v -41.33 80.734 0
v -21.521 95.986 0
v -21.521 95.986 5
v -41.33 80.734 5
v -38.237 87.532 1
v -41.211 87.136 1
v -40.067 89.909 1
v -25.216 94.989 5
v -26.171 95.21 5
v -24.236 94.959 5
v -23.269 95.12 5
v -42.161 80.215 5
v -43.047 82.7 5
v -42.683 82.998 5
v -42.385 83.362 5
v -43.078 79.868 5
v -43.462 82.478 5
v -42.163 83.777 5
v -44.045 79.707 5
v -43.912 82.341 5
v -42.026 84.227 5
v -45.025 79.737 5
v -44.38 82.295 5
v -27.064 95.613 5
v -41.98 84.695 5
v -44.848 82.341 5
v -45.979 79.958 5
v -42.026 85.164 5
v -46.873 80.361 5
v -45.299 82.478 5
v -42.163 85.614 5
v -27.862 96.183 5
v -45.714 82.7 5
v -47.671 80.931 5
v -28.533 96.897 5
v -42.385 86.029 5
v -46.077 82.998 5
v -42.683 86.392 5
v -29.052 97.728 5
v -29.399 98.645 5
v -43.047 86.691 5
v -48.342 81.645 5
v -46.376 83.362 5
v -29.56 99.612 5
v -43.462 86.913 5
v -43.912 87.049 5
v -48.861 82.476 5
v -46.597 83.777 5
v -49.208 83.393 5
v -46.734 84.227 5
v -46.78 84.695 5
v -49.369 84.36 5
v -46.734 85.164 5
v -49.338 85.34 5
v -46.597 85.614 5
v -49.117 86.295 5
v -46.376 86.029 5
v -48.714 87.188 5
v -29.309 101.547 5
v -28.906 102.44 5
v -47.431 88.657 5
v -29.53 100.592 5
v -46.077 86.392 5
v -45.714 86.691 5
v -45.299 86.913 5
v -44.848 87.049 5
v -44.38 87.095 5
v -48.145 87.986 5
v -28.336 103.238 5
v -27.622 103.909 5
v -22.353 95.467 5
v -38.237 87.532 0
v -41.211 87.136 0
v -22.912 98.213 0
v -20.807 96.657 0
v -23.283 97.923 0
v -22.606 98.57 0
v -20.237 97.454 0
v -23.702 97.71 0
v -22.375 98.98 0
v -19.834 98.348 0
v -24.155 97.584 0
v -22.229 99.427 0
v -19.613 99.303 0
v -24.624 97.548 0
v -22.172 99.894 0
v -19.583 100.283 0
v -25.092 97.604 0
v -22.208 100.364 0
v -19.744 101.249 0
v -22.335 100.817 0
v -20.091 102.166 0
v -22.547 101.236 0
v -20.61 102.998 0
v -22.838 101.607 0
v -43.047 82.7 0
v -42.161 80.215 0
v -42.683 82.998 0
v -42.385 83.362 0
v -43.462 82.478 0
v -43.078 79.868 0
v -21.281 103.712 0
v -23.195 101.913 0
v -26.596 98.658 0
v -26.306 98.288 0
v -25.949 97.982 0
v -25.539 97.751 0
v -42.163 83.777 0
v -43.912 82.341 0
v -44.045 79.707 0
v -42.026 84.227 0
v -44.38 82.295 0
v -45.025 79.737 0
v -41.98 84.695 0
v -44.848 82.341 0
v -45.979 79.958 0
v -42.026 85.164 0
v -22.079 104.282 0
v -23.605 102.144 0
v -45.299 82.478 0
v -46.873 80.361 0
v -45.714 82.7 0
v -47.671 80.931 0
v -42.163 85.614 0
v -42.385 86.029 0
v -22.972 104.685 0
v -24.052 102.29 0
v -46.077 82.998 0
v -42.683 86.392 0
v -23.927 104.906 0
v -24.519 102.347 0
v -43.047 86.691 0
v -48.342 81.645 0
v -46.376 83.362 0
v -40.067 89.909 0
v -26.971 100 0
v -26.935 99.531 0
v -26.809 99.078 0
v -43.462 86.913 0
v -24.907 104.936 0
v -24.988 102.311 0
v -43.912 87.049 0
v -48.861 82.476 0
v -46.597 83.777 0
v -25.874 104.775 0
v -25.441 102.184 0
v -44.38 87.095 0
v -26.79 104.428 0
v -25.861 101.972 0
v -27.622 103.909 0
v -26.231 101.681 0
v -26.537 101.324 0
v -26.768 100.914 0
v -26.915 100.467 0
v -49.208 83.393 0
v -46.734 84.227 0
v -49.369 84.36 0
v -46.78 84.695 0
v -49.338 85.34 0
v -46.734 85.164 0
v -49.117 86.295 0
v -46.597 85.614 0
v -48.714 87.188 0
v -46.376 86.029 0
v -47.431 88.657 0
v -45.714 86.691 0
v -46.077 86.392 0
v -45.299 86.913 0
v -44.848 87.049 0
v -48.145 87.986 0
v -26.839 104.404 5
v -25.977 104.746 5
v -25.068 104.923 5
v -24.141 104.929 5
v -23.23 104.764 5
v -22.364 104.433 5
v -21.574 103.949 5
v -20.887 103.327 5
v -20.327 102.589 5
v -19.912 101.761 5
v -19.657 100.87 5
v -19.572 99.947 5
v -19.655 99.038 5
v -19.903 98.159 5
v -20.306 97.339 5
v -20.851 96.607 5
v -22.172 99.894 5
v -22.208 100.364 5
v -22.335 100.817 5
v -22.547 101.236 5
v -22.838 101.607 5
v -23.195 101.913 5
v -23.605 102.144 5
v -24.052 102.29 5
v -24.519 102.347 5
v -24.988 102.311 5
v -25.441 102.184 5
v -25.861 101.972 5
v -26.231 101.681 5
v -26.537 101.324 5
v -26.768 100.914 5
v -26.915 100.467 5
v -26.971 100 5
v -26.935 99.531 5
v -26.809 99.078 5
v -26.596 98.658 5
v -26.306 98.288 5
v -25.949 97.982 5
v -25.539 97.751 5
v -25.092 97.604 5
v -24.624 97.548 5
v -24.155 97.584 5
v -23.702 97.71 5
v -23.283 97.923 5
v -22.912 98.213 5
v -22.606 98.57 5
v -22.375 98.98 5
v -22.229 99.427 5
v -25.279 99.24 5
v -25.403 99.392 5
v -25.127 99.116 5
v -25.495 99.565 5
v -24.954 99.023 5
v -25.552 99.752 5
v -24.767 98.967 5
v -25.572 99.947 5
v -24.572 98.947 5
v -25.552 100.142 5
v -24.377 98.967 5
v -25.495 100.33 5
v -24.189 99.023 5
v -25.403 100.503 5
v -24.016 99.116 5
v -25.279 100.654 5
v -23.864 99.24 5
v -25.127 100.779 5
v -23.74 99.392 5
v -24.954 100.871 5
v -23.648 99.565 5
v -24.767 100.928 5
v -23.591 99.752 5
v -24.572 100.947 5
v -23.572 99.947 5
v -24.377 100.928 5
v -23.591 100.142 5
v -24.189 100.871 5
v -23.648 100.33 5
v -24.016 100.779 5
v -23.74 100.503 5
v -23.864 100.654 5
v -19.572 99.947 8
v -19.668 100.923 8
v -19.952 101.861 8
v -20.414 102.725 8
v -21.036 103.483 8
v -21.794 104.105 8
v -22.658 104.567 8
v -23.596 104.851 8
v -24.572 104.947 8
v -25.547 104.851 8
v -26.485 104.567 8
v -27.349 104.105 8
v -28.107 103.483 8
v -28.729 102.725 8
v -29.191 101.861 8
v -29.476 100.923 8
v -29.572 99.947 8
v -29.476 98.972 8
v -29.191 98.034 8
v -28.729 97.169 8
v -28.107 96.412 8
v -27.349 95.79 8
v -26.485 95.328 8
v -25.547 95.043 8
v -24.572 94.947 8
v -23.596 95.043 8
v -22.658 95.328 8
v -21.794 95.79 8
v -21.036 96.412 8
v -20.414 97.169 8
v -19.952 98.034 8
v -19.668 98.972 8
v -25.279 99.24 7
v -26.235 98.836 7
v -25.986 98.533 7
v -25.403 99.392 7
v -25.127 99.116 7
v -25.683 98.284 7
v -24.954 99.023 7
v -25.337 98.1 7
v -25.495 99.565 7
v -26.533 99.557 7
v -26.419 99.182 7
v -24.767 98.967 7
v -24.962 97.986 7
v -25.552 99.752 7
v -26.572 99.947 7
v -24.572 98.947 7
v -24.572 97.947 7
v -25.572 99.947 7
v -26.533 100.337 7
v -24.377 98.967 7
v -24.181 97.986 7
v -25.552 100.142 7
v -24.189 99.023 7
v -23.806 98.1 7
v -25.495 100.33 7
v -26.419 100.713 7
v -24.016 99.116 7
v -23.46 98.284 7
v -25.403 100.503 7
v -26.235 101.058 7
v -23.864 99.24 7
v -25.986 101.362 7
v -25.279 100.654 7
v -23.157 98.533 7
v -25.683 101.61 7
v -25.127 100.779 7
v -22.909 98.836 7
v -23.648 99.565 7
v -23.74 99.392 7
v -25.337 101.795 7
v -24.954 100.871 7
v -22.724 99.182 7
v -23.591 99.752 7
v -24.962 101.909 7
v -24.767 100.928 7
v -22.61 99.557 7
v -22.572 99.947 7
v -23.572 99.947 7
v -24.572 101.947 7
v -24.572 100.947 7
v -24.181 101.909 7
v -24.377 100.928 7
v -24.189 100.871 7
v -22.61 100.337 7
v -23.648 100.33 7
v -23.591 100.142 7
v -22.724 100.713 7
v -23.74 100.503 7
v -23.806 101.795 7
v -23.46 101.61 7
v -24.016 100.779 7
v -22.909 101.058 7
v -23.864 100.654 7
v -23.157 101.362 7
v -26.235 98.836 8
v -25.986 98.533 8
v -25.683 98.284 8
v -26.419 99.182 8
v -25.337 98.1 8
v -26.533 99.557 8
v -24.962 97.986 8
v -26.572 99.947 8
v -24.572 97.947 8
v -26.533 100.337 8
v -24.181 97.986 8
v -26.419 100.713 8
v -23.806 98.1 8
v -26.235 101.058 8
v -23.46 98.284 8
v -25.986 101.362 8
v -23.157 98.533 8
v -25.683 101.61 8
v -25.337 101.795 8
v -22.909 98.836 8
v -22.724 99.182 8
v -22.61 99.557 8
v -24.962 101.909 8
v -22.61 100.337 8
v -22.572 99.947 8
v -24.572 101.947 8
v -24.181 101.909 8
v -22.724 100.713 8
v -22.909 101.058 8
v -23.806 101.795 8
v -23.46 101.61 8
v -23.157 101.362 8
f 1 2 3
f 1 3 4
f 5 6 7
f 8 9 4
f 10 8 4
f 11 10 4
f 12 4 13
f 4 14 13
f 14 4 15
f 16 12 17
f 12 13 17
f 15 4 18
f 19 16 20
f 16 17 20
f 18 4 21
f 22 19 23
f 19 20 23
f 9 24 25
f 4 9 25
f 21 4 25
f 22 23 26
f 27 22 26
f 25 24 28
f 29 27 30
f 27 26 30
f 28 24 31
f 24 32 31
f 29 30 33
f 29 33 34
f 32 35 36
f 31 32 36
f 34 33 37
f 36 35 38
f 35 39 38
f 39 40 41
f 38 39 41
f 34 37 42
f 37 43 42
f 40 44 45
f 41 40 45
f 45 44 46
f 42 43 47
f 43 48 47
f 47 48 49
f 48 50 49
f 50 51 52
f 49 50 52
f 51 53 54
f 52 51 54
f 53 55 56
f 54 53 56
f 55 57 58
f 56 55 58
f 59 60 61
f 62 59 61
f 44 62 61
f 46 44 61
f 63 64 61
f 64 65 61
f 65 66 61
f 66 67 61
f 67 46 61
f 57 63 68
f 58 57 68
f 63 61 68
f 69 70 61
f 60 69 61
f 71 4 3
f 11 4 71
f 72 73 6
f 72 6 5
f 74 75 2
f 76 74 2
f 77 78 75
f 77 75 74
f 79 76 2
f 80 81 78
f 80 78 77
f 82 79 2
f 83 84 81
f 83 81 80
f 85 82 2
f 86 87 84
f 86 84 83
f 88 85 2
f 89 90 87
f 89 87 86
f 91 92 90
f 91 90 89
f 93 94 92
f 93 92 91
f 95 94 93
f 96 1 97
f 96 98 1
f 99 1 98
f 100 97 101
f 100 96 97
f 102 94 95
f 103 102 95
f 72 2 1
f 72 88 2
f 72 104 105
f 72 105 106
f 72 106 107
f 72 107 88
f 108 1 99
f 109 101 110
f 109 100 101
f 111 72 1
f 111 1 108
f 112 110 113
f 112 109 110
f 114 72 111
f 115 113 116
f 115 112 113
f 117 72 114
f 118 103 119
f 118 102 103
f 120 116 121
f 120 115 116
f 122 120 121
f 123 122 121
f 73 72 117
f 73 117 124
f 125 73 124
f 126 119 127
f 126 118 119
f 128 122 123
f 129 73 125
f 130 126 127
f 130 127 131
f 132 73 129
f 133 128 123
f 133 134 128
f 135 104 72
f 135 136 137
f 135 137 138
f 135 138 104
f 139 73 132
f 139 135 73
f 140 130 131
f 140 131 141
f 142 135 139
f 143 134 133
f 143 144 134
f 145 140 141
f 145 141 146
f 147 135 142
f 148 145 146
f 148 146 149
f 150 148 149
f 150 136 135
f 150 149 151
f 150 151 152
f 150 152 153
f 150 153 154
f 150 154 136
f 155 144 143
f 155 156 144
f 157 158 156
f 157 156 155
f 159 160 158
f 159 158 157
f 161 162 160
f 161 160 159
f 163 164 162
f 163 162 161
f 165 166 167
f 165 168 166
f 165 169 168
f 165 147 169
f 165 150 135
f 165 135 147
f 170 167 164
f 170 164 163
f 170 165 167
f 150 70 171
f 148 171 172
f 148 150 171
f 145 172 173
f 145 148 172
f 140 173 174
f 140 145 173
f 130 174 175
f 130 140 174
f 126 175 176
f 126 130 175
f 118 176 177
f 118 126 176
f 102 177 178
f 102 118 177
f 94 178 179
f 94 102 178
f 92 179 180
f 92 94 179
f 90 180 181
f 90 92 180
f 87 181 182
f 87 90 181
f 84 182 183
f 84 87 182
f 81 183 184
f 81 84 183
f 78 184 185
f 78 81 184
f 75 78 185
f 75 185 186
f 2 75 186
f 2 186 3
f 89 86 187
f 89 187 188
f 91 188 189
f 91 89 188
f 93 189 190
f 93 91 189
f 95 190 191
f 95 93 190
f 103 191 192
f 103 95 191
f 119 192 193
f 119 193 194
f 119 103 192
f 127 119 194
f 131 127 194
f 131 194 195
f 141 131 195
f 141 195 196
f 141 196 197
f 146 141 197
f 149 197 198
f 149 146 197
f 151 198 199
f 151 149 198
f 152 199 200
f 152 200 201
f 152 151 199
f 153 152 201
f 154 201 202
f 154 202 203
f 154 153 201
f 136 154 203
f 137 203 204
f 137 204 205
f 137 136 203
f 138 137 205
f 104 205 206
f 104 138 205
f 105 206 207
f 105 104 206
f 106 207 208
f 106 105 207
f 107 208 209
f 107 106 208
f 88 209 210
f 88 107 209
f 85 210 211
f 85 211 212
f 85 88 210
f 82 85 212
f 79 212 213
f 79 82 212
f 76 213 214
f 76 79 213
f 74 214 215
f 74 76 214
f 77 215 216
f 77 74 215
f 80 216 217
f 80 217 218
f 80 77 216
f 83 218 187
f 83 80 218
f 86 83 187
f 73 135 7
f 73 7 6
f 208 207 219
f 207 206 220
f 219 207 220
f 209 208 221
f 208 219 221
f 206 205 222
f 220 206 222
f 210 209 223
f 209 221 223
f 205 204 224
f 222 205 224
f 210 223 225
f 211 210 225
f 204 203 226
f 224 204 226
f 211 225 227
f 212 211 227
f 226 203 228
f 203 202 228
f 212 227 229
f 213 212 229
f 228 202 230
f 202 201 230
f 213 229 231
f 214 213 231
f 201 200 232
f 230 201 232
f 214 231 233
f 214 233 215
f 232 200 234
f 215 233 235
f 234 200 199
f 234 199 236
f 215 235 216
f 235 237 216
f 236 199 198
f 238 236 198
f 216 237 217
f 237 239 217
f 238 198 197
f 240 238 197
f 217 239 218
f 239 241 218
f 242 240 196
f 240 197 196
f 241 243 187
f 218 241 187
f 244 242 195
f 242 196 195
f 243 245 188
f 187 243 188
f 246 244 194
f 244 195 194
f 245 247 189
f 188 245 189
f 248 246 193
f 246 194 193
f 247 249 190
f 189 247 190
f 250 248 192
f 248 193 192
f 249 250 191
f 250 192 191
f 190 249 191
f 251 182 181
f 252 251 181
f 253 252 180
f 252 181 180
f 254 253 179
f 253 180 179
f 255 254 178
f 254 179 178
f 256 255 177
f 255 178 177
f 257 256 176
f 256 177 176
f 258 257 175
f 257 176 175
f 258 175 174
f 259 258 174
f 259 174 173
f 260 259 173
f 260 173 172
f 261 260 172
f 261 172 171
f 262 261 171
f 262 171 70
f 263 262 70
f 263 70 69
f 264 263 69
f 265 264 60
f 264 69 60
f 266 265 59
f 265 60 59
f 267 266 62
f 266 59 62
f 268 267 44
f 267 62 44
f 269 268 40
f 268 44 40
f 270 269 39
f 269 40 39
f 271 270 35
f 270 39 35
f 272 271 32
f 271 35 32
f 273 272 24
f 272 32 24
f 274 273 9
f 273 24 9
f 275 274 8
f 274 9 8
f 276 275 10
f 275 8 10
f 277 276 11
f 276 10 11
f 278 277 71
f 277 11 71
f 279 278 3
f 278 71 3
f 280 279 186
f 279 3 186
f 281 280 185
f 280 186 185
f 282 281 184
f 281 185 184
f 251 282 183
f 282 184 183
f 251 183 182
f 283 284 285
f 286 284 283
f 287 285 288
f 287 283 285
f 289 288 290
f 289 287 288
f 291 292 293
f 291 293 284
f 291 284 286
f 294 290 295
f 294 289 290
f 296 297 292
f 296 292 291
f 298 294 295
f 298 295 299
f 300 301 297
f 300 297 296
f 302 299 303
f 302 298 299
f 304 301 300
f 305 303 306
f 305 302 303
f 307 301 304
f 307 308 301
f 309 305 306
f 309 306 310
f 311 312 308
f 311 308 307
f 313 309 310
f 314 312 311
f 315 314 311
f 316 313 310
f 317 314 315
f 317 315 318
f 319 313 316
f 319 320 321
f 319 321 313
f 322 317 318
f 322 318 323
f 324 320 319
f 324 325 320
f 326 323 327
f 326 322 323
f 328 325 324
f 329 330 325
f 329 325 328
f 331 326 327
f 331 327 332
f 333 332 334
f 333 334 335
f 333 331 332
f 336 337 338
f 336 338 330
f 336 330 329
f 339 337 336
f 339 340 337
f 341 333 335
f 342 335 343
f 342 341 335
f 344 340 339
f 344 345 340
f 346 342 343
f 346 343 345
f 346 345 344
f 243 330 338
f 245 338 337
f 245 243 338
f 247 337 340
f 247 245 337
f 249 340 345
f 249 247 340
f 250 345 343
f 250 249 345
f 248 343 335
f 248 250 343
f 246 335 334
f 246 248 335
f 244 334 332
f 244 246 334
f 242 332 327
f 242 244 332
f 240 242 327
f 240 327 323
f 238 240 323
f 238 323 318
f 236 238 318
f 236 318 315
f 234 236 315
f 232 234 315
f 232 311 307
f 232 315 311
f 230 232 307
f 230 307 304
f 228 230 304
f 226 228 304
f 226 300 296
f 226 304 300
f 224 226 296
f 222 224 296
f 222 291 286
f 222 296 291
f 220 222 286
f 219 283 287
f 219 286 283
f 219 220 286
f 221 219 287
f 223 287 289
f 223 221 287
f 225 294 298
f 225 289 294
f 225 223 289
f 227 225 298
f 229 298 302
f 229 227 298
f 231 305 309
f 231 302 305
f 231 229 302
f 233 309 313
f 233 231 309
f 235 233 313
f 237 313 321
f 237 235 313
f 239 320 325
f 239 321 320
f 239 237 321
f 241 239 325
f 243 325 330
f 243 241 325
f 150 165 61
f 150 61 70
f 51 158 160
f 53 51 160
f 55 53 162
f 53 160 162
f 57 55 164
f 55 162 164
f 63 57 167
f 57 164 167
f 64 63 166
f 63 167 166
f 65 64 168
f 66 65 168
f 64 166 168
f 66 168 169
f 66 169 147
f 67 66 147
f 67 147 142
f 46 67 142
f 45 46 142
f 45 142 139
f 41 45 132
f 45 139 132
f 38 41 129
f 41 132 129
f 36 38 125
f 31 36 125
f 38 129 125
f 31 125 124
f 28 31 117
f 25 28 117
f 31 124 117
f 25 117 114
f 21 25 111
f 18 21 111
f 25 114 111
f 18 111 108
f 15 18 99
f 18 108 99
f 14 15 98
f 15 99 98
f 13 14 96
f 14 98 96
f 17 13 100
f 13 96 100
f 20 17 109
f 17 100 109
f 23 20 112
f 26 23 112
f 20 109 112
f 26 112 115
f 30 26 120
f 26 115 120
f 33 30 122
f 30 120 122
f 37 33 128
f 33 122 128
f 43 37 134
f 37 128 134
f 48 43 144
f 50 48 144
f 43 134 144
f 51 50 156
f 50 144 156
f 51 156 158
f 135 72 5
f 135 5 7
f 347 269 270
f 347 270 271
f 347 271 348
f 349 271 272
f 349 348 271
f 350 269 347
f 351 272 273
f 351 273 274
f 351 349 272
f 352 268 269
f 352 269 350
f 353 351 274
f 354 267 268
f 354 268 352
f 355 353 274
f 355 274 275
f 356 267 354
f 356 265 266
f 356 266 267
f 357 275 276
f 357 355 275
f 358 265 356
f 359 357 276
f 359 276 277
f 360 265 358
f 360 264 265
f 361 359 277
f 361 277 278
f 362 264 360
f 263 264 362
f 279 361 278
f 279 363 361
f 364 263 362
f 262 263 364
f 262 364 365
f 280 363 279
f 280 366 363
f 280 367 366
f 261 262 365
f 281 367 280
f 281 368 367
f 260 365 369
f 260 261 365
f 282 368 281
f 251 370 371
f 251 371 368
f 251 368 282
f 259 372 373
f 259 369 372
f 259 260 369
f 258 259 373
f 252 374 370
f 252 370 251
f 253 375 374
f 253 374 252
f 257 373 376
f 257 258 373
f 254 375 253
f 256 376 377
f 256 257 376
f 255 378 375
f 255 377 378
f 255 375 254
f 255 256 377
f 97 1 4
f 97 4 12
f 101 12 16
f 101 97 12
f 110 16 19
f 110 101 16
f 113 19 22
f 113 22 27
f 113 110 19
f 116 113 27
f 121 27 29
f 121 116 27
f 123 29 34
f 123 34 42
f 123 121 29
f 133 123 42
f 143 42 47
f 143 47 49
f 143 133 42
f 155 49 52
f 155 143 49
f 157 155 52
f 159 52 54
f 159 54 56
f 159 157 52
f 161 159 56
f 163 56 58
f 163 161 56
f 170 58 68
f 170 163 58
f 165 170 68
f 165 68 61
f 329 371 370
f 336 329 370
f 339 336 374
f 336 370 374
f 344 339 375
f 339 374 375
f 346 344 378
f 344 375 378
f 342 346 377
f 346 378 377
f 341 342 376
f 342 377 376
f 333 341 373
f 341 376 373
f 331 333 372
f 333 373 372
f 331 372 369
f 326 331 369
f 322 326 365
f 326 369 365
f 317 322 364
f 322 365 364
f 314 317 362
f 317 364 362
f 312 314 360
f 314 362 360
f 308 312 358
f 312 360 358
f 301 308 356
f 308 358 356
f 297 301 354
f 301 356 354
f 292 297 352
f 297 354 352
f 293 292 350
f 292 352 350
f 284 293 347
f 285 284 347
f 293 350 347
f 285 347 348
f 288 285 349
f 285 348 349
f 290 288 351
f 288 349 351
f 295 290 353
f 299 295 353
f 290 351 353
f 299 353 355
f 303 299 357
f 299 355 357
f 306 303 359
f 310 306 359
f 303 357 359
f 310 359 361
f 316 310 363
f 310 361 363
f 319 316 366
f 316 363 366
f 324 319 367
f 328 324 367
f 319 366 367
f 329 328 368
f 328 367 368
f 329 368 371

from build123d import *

# Parameters (mm, degrees)
SKETCH1_R           = 2.4
BOSS_EXTRUDE1_DEPTH = 5
SKETCH2_R           = 2.4
CUT_EXTRUDE1_DEPTH  = 5
CUT_EXTRUDE2_DEPTH  = 1
SKETCH5_R           = 5
SKETCH5_R_2         = 1
BOSS_EXTRUDE2_DEPTH = 3
SKETCH6_R           = 2
CUT_EXTRUDE3_DEPTH  = 1


with BuildPart() as part:
    # Sketch1 → Boss-Extrude1 (new body)
    with BuildSketch(Plane(origin=(0, 0, 0), x_dir=(0.999757303, -0.022030336, 0), z_dir=(0, 0, 1))):
        with BuildLine():
            Line((-49.372163993, 87.590629426), (-29.904437649, 103.275259833))
            ThreePointArc((-29.904437649, 103.275259833), (-22.873966299, 102.518640646), (-23.630585486, 95.488169295))
            Line((-23.630585486, 95.488169295), (-43.09831183, 79.803538889))
            ThreePointArc((-43.09831183, 79.803538889), (-50.12878318, 80.560158076), (-49.372163993, 87.590629426))
        make_face()
        with Locations((-26.767511567, 99.381714564)):
            Circle(SKETCH1_R, mode=Mode.SUBTRACT)
    extrude(amount=BOSS_EXTRUDE1_DEPTH)

    # Sketch2 → Cut-Extrude1 (cut)
    with BuildSketch(Plane(origin=(0, 0, 0), x_dir=(-1, 0, 0), z_dir=(0, 0, -1))):
        with Locations((44.380141864, 84.695348924)):
            Circle(SKETCH2_R)
    extrude(amount=-CUT_EXTRUDE1_DEPTH, mode=Mode.SUBTRACT)

    # Sketch4 → Cut-Extrude2 (cut)
    with BuildSketch(Plane(origin=(0, 0, 0), x_dir=(-1, 0, 0), z_dir=(0, 0, -1))):
        Polygon((38.237095204, 87.532175923), (40.067328392, 89.909200633), (41.210775583, 87.135659842), align=None)
    extrude(amount=-CUT_EXTRUDE2_DEPTH, mode=Mode.SUBTRACT)

    # Sketch5 → Boss-Extrude2 (add)
    with BuildSketch(Plane.XY.offset(5)):
        with Locations((-24.571602608, 99.947292162)):
            Circle(SKETCH5_R)
        with Locations((-24.571602608, 99.947292162)):
            Circle(SKETCH5_R_2, mode=Mode.SUBTRACT)
    extrude(amount=BOSS_EXTRUDE2_DEPTH)

    # Sketch6 → Cut-Extrude3 (cut)
    with BuildSketch(Plane.XY.offset(8)):
        with Locations((-24.571602608, 99.947292162)):
            Circle(SKETCH6_R)
    extrude(amount=-CUT_EXTRUDE3_DEPTH, mode=Mode.SUBTRACT)


solid = part.part
